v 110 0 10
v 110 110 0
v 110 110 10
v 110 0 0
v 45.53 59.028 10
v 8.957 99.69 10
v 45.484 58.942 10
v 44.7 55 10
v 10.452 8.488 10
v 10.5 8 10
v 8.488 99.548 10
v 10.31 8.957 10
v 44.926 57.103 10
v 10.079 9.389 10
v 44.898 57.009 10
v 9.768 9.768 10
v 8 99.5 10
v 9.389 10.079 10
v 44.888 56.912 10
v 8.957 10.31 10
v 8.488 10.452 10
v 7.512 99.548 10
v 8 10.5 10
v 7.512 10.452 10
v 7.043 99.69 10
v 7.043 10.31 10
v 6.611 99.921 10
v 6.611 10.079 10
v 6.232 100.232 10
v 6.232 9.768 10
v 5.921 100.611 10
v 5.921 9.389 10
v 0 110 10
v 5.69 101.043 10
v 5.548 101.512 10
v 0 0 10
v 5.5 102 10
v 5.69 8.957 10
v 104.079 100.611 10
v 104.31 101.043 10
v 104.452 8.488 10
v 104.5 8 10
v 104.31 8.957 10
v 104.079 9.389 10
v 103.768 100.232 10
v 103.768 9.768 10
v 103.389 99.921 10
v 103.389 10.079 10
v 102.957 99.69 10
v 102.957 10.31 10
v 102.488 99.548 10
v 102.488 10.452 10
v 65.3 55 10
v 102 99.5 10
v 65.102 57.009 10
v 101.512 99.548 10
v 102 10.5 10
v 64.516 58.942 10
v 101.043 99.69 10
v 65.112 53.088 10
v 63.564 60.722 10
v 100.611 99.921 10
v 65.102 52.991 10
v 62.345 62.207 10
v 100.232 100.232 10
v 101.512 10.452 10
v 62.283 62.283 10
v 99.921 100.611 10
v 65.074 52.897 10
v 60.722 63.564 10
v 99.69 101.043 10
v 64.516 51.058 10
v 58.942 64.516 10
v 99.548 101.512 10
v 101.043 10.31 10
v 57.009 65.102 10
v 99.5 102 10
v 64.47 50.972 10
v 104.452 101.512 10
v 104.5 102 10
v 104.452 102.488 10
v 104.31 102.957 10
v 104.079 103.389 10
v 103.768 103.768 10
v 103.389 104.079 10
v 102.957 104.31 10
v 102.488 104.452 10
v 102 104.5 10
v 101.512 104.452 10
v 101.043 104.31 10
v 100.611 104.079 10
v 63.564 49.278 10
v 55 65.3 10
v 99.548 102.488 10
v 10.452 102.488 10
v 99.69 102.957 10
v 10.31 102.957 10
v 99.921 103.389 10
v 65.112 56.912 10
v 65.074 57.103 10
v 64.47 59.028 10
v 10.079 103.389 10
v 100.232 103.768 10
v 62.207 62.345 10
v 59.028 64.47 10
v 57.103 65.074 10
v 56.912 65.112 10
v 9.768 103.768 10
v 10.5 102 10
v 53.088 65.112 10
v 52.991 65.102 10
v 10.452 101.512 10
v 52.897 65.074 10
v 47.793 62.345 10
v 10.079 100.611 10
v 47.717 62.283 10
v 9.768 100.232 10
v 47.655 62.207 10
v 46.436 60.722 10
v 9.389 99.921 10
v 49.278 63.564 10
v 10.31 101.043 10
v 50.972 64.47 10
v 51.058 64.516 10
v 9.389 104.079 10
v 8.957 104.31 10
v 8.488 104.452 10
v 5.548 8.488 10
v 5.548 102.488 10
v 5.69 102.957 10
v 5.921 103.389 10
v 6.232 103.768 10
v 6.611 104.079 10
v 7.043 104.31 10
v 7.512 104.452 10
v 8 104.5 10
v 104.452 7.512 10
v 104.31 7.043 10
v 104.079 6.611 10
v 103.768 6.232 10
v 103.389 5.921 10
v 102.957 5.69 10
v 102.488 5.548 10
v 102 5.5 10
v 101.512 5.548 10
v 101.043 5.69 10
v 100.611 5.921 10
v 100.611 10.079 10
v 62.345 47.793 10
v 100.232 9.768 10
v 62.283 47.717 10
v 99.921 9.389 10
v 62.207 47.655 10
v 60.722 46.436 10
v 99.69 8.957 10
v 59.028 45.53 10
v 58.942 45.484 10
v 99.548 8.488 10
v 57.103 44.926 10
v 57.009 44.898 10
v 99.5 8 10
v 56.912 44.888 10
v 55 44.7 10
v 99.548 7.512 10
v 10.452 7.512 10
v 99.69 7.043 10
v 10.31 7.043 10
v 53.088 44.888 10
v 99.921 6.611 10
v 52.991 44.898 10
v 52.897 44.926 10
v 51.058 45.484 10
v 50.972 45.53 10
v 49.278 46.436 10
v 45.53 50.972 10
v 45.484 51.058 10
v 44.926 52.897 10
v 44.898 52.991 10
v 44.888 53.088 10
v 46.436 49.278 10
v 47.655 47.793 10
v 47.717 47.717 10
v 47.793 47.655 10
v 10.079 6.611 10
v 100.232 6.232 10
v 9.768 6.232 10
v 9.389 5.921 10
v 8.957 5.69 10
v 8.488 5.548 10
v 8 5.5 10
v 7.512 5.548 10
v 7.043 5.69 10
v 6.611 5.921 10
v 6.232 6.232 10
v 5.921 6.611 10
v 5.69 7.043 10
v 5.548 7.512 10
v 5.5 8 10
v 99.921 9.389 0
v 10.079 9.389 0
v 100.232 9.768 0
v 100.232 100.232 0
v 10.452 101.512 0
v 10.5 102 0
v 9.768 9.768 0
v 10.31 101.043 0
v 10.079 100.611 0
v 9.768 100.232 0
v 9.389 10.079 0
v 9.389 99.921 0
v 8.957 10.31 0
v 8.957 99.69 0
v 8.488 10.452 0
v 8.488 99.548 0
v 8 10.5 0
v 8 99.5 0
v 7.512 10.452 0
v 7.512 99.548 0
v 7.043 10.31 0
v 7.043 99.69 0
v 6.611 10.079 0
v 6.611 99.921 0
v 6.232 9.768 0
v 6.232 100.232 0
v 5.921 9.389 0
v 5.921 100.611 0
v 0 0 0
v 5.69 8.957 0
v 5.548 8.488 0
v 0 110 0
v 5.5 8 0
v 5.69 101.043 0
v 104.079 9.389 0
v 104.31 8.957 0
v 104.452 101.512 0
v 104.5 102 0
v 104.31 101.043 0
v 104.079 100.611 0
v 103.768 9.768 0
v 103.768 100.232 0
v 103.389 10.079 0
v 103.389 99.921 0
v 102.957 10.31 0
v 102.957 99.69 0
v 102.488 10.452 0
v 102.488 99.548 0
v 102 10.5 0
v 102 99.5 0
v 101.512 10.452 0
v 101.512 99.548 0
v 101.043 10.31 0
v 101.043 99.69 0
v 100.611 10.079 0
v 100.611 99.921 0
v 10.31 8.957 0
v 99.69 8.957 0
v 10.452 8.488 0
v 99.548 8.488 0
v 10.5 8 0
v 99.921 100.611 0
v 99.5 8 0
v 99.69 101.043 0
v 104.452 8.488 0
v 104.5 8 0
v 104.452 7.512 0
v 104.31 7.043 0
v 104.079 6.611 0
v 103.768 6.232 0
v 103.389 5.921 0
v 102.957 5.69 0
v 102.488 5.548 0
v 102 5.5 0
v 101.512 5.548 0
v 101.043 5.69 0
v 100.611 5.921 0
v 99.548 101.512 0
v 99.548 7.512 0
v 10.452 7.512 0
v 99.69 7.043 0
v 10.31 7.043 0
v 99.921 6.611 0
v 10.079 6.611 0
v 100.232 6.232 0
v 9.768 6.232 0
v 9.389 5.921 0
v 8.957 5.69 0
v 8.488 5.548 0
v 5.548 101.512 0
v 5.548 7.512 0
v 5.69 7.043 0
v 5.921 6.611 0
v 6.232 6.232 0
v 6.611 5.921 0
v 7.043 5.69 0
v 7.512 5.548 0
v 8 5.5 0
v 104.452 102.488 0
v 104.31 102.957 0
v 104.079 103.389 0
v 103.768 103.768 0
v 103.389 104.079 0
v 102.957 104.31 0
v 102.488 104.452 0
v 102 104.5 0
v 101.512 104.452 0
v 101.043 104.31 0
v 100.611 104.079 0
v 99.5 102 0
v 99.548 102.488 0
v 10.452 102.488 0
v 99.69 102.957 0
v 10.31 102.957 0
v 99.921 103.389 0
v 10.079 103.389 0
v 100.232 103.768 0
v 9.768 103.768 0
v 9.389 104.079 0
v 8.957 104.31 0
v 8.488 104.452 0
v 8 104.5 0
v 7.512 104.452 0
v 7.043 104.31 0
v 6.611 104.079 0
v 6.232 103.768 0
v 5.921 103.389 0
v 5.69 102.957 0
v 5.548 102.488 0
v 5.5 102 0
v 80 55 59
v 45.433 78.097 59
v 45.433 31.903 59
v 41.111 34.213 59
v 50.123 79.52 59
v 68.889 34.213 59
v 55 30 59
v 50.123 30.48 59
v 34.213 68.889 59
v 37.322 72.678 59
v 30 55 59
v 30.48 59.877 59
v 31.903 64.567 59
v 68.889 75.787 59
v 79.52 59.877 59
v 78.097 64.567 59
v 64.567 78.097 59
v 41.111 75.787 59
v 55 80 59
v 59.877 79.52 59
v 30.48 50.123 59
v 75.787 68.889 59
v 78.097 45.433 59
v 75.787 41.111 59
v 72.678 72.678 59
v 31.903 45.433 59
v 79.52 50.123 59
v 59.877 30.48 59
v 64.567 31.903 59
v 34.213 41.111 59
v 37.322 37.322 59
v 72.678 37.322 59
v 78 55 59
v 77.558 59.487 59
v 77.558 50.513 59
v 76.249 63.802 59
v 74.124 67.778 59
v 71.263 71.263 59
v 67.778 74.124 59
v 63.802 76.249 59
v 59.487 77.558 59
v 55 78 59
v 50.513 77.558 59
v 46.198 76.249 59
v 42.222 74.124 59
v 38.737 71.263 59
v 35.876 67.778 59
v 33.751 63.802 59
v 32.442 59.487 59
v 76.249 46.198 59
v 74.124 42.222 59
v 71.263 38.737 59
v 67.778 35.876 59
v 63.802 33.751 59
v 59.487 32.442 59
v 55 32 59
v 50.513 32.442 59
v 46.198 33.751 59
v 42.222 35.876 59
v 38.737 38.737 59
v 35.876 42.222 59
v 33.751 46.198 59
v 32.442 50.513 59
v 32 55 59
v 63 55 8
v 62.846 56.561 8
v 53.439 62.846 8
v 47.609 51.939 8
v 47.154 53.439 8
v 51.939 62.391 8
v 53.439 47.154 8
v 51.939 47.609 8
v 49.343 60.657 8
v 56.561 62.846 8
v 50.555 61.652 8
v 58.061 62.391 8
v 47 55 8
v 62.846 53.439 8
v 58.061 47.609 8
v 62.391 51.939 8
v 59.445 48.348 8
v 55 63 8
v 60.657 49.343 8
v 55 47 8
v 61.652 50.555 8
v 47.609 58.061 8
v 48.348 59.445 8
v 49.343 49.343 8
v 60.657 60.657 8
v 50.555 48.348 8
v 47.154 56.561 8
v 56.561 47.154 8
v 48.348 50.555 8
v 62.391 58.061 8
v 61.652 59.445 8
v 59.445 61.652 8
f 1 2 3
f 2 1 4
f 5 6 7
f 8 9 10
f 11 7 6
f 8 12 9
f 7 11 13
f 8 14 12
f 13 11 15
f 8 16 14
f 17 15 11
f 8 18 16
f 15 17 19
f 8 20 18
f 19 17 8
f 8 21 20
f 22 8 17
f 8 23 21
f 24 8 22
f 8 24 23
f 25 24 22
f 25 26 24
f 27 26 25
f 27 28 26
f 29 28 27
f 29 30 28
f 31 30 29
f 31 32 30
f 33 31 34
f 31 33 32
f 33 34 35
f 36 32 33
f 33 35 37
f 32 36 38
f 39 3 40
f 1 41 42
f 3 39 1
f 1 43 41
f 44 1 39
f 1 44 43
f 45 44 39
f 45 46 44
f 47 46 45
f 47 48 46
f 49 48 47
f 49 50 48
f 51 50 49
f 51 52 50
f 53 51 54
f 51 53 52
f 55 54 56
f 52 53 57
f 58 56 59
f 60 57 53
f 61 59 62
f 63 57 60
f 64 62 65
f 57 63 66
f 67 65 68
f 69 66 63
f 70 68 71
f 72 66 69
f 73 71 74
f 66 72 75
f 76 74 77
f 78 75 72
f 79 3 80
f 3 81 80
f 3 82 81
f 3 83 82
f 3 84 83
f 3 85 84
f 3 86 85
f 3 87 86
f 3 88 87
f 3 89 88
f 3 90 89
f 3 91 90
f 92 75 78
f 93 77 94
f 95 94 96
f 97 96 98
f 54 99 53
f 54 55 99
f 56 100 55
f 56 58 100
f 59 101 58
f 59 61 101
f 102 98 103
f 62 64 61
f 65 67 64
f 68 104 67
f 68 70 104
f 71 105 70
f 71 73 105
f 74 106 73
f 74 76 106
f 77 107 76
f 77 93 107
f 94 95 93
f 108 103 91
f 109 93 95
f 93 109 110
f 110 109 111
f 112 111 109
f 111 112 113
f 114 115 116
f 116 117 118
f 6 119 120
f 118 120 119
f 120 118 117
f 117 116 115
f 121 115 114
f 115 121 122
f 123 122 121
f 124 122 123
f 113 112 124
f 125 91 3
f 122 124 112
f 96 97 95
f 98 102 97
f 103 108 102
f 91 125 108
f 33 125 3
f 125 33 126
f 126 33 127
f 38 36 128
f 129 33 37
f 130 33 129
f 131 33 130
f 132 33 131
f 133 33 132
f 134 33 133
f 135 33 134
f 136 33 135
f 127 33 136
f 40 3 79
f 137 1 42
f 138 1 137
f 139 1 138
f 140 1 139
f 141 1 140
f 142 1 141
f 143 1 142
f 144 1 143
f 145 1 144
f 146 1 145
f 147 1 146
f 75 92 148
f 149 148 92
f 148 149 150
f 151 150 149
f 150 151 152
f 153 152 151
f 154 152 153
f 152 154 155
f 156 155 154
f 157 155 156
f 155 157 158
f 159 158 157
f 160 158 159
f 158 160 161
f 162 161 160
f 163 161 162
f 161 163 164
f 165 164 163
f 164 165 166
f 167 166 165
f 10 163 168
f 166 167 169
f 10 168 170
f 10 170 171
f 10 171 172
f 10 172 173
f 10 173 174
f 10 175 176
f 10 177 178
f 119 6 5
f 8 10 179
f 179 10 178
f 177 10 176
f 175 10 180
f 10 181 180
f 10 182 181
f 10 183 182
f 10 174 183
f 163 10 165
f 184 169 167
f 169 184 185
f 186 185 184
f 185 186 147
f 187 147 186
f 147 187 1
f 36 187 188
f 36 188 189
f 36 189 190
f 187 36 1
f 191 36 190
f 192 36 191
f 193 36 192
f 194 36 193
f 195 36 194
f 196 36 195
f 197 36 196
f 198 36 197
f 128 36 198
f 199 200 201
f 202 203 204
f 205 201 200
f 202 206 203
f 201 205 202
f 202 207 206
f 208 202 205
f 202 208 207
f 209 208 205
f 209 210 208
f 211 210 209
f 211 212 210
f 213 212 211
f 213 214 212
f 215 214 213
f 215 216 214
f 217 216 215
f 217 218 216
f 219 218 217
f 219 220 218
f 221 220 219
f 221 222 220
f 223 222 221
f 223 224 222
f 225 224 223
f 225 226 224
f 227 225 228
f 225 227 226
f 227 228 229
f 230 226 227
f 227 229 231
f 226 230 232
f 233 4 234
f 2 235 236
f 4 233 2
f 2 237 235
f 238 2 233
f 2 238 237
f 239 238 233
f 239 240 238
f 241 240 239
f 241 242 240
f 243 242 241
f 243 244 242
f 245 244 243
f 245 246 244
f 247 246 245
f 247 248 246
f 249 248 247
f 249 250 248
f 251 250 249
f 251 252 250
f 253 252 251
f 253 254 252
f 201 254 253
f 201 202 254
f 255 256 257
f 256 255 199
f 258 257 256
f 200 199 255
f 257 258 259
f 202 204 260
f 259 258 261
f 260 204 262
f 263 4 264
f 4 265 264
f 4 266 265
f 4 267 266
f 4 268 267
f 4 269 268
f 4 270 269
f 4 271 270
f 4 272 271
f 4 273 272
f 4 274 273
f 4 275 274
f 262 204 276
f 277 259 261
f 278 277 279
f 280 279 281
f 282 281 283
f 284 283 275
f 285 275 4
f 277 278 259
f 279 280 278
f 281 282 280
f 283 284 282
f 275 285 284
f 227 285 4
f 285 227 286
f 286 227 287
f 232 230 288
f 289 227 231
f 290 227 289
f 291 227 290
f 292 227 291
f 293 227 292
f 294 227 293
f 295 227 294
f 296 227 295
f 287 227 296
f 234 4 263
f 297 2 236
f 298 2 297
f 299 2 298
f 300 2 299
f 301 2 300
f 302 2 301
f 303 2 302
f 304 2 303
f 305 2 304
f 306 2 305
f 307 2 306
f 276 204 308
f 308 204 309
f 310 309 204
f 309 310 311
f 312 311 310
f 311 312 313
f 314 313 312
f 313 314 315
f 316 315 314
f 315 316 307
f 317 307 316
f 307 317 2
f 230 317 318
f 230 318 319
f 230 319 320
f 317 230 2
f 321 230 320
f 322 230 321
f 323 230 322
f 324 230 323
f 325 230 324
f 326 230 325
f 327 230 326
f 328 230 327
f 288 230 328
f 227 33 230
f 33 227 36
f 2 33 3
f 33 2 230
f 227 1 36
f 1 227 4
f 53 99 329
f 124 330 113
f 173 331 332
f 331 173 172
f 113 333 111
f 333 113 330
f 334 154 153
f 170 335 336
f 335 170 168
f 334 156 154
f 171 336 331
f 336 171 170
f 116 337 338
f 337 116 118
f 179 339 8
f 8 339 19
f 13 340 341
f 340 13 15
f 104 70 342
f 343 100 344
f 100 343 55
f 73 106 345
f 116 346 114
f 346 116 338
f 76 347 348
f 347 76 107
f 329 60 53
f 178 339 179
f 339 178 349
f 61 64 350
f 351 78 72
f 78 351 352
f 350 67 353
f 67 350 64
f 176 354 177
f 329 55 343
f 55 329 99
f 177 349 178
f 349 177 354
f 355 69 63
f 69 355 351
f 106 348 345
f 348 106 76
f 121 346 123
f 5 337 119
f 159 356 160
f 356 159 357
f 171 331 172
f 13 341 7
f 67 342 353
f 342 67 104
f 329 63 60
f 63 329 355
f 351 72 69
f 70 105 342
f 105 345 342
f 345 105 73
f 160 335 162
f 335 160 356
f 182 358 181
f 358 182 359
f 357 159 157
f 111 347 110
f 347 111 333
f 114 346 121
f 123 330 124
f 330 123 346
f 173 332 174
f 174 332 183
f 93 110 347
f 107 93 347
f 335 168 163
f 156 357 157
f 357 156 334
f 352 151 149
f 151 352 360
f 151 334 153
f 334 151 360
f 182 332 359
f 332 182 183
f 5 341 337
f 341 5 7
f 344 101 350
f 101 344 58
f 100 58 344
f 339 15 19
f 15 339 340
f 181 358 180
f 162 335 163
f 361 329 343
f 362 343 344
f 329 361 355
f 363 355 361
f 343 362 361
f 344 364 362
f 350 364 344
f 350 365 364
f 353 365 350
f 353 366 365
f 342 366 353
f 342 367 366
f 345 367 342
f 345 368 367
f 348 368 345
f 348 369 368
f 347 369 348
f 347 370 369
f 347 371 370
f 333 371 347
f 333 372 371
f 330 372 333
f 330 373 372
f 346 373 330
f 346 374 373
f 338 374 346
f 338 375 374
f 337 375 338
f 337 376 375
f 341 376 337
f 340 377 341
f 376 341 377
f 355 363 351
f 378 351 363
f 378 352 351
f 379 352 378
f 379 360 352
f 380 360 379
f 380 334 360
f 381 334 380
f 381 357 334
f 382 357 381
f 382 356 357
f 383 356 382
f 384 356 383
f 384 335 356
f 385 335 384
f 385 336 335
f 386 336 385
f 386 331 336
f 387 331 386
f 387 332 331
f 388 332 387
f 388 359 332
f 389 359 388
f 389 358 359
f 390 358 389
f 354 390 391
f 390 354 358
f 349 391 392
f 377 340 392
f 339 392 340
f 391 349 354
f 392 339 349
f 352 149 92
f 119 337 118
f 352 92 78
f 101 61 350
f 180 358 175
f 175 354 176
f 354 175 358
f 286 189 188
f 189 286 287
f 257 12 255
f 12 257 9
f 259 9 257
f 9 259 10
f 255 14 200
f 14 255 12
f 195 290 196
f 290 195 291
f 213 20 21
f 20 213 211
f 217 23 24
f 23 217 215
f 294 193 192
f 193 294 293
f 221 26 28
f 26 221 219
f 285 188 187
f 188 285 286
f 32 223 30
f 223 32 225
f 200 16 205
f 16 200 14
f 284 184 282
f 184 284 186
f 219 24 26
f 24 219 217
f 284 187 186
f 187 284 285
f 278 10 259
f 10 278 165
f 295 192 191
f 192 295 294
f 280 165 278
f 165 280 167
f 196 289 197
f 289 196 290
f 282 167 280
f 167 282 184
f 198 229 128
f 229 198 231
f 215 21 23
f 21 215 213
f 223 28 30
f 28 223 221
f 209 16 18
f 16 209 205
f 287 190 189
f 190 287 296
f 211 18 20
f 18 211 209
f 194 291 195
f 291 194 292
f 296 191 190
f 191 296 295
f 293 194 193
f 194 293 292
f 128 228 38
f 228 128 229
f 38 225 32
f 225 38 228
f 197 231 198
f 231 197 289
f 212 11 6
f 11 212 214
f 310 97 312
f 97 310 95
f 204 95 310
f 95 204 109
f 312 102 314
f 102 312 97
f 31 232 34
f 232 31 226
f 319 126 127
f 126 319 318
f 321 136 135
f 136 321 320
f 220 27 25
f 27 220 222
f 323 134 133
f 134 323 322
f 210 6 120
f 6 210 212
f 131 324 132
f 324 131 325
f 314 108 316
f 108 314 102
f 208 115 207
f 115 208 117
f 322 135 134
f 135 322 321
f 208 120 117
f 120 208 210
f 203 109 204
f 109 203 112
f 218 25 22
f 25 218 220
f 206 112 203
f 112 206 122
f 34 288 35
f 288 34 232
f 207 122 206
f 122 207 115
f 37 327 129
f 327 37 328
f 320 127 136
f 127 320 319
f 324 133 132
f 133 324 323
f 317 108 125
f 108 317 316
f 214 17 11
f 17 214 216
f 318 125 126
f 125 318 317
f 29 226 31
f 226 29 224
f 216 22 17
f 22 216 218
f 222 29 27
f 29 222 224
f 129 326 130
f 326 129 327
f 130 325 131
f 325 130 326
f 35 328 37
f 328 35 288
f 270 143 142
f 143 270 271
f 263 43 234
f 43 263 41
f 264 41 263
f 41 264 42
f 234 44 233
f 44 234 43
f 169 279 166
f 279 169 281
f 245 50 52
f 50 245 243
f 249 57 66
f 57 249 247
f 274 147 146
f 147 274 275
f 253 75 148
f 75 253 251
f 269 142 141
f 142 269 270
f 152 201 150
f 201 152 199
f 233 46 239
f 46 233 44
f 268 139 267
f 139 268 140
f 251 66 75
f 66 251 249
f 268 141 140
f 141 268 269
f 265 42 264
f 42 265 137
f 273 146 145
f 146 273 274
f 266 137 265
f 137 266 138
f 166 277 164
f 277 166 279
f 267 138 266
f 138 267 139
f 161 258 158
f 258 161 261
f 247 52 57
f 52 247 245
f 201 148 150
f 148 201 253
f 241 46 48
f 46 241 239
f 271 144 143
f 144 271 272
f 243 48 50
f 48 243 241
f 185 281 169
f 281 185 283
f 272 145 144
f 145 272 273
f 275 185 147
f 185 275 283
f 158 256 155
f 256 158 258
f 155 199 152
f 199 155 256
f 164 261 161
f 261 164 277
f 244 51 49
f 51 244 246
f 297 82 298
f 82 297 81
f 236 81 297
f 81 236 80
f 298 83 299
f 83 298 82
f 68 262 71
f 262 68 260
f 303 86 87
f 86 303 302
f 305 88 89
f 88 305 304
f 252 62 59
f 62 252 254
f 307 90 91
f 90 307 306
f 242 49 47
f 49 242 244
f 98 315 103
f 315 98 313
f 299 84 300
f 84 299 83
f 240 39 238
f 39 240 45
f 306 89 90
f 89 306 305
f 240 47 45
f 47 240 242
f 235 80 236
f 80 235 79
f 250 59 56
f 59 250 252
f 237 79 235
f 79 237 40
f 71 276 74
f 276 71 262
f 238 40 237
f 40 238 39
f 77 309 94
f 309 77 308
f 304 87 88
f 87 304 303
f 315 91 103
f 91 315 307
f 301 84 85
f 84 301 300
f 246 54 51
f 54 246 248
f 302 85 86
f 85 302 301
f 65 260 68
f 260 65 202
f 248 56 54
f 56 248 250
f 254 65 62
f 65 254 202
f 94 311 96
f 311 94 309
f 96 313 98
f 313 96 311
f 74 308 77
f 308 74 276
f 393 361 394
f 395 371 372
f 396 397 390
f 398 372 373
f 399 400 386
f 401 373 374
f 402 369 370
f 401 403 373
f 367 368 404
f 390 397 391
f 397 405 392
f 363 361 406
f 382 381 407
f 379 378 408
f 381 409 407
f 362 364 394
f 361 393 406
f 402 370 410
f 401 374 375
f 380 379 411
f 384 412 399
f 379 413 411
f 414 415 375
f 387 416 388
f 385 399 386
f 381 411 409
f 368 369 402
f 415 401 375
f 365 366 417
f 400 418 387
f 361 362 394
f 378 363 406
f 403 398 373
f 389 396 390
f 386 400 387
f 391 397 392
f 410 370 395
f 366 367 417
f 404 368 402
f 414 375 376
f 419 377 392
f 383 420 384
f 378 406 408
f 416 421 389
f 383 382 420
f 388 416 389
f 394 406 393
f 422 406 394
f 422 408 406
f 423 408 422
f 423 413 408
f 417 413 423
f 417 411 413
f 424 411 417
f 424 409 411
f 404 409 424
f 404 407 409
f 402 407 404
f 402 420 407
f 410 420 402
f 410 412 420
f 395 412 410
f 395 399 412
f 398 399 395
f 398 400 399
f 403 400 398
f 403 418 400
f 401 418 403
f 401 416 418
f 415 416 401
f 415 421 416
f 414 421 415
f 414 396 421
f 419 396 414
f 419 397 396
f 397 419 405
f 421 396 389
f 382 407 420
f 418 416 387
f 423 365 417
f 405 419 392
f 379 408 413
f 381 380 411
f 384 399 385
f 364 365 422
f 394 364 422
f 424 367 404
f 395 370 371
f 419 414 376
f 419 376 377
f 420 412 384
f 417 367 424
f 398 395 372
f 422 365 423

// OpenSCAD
$fn = 32;

// ----------------------------------------------------------------------
// Hopper: flanged with square flange
// ----------------------------------------------------------------------

// --- parameters (mm) ---
fl = 110;                 // flange side, X and Y
fl_t = 10;                // flange thickness
cone_h = 50;              // cone height above the flange
top_d = 50;               // cone mouth diameter
bot_d = 20;               // cone spout diameter
wall = 2;                 // cone wall thickness
hole_r = 2.5;             // flange hole radius
hole_in = 8;              // hole inset from the corners

bore_d = bot_d - 2 * wall;  // spout bore diameter
total_h = fl_t + cone_h - 1;  // overall height

difference() {
  union() {
    cube([fl, fl, fl_t]);
    translate([fl / 2, fl / 2, fl_t - 1])
      cylinder(h = cone_h, d1 = bot_d, d2 = top_d);
  }
  translate([fl / 2, fl / 2, fl_t - 2])
    cylinder(h = cone_h + 1, d1 = bore_d, d2 = top_d - 2 * wall);
  for (sx = [0, 1], sy = [0, 1])
    translate([sx ? fl - hole_in : hole_in,
               sy ? fl - hole_in : hole_in, -1])
      cylinder(r = hole_r, h = fl_t + 2);
}
